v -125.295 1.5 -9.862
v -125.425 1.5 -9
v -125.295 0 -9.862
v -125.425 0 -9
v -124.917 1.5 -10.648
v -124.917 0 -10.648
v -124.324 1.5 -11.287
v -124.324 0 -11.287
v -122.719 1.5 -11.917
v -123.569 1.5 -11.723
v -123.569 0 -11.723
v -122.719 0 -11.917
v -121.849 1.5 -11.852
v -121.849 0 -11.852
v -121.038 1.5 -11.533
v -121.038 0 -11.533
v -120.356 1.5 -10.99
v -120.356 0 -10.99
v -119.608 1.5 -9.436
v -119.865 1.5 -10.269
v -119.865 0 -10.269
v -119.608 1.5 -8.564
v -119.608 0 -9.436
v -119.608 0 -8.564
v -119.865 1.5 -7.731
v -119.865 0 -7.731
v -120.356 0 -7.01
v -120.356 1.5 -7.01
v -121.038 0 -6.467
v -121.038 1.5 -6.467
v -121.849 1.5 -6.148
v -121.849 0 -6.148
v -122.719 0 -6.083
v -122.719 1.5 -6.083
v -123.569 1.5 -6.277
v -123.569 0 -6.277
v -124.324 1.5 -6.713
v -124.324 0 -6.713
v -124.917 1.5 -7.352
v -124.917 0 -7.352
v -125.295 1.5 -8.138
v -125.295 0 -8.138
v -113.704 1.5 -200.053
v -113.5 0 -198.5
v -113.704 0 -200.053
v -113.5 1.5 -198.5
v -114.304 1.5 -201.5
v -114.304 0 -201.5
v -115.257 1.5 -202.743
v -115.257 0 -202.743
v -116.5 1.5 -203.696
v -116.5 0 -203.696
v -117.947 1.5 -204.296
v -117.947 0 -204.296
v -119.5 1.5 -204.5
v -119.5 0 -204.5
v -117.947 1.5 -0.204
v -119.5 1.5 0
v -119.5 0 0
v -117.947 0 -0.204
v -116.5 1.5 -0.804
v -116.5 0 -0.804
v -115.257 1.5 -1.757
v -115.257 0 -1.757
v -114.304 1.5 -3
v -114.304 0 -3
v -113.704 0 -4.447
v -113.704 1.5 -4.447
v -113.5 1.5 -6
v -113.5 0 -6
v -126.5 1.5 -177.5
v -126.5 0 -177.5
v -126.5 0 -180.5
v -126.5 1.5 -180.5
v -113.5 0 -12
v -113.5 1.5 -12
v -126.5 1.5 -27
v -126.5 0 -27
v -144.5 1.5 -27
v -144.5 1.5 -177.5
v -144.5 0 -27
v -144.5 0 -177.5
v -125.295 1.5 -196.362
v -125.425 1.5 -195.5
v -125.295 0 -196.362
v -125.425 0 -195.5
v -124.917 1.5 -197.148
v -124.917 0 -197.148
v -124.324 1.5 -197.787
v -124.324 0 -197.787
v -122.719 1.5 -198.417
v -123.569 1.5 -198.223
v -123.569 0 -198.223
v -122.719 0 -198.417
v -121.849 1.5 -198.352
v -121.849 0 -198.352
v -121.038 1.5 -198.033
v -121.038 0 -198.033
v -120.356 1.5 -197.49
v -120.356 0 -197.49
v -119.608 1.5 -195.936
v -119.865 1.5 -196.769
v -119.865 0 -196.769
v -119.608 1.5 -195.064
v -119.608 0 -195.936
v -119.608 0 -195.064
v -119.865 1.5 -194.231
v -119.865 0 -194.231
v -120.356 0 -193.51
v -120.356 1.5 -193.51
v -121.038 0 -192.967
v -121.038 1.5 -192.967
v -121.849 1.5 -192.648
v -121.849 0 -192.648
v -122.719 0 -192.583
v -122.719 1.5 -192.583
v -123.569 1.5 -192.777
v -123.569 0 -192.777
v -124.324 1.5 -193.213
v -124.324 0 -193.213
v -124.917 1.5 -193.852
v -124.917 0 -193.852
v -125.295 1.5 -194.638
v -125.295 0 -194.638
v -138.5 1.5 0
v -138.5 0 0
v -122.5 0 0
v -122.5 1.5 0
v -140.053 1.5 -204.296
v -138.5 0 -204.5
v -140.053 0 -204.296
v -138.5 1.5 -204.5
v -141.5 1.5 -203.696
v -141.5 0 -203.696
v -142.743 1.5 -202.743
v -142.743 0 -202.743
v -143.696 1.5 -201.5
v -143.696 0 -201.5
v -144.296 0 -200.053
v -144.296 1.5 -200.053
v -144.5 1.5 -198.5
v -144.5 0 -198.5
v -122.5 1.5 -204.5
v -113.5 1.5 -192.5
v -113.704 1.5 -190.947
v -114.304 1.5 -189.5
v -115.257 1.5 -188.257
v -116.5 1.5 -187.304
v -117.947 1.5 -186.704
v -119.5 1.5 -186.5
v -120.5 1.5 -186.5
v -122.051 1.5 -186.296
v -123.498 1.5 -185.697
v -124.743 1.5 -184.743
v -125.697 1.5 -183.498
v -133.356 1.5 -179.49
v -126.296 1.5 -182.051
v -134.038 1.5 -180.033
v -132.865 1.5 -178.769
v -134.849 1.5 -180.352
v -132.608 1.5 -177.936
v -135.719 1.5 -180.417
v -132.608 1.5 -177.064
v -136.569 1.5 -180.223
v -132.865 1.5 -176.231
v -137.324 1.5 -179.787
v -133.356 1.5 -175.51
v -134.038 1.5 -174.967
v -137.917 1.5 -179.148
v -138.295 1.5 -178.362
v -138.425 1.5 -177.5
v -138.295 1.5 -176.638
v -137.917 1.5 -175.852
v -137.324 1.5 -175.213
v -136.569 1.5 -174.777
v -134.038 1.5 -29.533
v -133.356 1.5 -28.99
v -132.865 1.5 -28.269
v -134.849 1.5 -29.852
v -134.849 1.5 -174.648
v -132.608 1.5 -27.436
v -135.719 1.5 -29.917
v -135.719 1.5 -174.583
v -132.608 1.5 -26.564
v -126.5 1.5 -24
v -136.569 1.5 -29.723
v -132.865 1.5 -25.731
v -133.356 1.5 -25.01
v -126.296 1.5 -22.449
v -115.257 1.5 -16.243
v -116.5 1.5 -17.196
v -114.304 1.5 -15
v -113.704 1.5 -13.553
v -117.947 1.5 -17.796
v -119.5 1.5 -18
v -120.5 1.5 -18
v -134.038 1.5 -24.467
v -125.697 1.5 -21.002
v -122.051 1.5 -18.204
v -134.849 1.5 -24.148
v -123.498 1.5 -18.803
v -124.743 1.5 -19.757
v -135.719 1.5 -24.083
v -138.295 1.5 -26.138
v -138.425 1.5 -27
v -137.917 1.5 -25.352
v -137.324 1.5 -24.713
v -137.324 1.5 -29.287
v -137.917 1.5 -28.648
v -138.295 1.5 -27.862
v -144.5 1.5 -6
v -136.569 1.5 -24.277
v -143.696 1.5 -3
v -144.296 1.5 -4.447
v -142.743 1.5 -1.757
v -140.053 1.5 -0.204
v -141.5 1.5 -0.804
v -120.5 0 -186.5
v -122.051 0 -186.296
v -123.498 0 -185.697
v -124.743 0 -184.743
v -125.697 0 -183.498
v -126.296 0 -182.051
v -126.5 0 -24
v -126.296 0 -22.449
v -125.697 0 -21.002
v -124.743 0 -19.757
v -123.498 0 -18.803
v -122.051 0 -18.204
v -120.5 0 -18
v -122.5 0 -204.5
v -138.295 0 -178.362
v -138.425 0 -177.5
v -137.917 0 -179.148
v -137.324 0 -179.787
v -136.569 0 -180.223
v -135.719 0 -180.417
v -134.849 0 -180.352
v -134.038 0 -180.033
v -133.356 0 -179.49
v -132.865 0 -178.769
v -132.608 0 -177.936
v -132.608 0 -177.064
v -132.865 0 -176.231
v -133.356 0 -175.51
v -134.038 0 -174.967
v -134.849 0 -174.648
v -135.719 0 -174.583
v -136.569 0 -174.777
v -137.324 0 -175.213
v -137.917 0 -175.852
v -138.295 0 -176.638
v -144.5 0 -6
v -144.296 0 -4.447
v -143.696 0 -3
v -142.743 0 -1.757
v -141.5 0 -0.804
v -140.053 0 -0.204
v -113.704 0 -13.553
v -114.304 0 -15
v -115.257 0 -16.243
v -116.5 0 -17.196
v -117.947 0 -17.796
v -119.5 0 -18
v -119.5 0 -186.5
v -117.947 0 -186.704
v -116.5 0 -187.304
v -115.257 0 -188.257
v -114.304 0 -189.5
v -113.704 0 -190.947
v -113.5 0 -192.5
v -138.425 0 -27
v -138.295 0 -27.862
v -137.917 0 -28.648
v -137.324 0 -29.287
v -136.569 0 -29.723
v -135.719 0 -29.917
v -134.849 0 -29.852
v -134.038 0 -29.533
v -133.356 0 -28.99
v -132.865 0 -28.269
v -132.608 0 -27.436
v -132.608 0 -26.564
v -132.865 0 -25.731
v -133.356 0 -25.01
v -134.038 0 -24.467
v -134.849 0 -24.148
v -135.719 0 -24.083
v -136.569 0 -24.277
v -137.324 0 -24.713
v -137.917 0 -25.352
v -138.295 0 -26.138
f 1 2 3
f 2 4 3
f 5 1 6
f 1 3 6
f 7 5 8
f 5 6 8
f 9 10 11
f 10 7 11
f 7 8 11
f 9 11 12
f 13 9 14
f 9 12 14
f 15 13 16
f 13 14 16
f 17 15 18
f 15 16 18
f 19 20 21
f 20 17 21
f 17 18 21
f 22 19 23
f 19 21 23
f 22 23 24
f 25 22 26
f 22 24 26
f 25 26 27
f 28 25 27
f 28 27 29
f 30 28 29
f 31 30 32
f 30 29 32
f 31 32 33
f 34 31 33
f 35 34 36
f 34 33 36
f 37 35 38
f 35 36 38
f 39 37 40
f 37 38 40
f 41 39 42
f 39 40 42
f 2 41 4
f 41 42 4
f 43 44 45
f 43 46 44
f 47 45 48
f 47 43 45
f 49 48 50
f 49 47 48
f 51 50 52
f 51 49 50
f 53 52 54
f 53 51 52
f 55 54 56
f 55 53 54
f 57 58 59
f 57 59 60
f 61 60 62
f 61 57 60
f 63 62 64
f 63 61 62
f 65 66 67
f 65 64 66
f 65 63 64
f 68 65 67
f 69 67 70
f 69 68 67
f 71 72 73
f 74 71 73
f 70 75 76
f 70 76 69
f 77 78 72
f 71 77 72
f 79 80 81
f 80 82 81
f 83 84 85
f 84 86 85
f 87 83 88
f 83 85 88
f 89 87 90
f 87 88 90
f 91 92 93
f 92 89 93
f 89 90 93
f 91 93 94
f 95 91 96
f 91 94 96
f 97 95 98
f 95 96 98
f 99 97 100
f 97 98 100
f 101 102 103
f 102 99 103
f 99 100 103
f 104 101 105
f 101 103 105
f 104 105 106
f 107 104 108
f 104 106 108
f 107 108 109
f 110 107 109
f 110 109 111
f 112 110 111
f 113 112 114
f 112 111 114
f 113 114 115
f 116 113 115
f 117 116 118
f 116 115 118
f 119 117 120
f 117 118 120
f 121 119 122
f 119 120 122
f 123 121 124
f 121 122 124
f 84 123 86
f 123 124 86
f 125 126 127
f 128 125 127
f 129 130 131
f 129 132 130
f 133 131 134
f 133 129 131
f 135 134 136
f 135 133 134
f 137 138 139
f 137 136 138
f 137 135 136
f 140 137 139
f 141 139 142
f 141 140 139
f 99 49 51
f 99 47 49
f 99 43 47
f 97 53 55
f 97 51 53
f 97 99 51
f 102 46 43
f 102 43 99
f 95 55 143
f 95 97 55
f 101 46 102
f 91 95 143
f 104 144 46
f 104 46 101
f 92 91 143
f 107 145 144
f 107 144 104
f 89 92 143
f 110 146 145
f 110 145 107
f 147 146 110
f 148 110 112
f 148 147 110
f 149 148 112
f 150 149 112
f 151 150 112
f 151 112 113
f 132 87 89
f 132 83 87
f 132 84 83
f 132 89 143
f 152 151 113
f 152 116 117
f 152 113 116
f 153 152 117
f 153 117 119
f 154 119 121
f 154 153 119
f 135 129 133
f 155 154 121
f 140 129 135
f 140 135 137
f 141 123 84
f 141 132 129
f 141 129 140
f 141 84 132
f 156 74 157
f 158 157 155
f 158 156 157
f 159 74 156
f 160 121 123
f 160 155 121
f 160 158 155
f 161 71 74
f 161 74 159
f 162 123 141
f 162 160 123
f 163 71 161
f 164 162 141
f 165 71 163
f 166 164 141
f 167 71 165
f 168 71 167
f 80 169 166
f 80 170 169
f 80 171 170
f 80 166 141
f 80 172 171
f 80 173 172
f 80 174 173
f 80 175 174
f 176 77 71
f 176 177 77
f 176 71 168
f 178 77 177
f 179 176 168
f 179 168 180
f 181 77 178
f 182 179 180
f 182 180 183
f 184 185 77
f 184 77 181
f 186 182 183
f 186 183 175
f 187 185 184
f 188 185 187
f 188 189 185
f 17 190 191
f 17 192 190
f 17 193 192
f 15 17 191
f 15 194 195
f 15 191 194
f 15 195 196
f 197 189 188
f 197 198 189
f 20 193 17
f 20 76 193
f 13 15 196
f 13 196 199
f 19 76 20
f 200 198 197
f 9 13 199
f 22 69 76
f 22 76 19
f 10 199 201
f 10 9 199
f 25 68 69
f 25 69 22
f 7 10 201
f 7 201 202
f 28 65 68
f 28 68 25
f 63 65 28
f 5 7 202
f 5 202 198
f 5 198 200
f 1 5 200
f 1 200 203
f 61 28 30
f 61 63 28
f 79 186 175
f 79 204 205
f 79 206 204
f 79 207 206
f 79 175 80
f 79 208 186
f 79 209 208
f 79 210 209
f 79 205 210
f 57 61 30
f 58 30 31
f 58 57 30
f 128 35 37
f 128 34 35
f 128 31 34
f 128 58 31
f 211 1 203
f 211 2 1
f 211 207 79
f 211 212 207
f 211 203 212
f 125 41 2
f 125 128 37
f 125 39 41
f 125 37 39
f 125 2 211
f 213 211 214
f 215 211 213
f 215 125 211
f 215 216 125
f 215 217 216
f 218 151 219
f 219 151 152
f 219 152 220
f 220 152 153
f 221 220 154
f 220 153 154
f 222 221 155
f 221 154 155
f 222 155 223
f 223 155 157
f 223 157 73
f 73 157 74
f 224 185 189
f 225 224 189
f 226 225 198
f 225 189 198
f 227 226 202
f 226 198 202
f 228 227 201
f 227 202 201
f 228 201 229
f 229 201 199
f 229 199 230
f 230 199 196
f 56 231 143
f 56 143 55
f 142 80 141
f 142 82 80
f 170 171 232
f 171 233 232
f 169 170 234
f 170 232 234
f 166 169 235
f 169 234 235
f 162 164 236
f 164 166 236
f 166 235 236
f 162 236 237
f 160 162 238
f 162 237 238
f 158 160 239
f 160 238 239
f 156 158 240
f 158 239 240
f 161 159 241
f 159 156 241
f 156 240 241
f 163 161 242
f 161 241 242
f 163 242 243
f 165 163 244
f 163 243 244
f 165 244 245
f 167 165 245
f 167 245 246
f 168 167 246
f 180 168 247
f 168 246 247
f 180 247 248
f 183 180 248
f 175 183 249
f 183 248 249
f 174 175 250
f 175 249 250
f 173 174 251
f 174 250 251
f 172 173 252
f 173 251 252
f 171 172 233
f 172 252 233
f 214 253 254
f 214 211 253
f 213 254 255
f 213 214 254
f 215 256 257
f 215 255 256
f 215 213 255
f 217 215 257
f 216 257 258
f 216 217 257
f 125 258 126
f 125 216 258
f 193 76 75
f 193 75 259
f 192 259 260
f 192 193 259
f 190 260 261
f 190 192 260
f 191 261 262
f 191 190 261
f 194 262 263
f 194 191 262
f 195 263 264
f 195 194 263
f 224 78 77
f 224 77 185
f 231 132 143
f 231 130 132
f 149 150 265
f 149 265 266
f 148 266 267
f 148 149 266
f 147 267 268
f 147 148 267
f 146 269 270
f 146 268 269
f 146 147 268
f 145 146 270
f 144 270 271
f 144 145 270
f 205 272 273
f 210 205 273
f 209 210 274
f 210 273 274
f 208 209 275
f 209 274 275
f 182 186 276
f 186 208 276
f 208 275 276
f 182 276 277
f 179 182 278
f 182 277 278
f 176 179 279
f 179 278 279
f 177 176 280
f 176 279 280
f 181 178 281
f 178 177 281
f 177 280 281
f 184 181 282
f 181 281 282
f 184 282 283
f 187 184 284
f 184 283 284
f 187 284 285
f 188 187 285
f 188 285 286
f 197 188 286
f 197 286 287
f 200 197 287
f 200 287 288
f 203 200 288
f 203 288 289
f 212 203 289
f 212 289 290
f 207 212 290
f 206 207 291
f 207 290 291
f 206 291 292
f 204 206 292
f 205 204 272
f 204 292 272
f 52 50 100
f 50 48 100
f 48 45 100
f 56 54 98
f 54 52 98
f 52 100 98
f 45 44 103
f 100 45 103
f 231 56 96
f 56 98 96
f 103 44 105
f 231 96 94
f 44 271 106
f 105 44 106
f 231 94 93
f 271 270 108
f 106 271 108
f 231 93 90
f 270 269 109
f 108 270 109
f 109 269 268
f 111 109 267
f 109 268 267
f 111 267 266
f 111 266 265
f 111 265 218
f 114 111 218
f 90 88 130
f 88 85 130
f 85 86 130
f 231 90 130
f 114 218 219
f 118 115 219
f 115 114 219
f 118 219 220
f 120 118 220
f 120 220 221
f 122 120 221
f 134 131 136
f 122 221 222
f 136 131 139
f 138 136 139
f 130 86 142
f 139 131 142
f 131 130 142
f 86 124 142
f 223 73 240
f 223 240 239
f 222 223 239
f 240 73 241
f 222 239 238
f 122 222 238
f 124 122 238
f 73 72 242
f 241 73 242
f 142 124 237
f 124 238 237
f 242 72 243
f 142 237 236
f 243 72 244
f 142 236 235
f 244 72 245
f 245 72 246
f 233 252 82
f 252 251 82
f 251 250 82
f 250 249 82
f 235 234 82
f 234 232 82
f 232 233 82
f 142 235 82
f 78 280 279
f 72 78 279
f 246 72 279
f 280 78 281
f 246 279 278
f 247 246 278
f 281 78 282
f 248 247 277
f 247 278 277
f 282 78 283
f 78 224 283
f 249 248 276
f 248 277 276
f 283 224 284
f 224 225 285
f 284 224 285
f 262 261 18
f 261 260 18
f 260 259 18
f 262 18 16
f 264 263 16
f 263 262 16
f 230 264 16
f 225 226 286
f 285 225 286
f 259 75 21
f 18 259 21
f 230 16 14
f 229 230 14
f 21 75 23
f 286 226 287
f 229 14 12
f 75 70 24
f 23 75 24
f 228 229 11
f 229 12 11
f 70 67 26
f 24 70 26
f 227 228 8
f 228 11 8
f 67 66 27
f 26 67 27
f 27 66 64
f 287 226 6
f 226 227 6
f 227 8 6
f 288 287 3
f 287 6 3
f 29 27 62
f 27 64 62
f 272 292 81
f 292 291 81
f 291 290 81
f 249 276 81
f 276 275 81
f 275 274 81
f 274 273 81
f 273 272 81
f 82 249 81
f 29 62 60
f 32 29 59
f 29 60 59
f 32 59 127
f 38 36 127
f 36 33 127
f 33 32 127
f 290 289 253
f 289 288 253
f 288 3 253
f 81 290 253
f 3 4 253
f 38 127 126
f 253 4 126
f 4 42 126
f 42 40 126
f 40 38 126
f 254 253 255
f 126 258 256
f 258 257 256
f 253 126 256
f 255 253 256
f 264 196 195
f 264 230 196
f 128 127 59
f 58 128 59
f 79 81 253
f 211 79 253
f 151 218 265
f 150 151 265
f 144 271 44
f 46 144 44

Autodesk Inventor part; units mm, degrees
ref_plane "YZ Plane" through (0, 0, 0) normal (1, 0, 0) x (0, 1, 0)
ref_plane "XZ Plane" through (0, 0, 0) normal (0, 1, 0) x (-1, 0, 0)
ref_plane "XY Plane" through (0, 0, 0) normal (0, 0, 1) x (1, 0, 0)
sketch "Sketch1" plane through (0, 0, 0) normal (0, 1, 0) x (-1, 0, 0)
  line L0 (0, 0) -> (144.5, 0) construction
  line L1 (144.5, 0) -> (144.5, -204.5) construction
  line L2 (144.5, -204.5) -> (0, -204.5) construction
  line L3 (0, -204.5) -> (0, 0) construction
  circle A0 centre (135.5, -27) radius 3 construction
  circle A1 centre (122.5, -9) radius 3 construction
  circle A2 centre (135.5, -177.5) radius 3 construction
  circle A3 centre (122.5, -195.5) radius 3 construction
  circle A4 centre (22, -195.5) radius 3 construction
  circle A5 centre (9, -177.5) radius 3 construction
  circle A6 centre (9, -27) radius 3 construction
  circle A7 centre (22, -9) radius 3 construction
  line L4 (12, -12) -> (132.5, -12) construction
  line L5 (132.5, -12) -> (132.5, -192.5) construction
  line L6 (132.5, -192.5) -> (12, -192.5) construction
  line L7 (12, -192.5) -> (12, -12) construction
  circle A8 centre (22, -9) radius 2.925
  circle A9 centre (9, -27) radius 2.925
  circle A10 centre (122.5, -9) radius 2.925
  circle A11 centre (135.5, -27) radius 2.925
  circle A12 centre (135.5, -177.5) radius 2.925
  circle A13 centre (122.5, -195.5) radius 2.925
  circle A14 centre (22, -195.5) radius 2.925
  circle A15 centre (9, -177.5) radius 2.925
  line L8 (122.5, -9) -> (135.5, -9) construction
  line L9 (135.5, -9) -> (135.5, -27) construction
  line L10 (126.5, -27) -> (126.5, -18)
  line L11 (126.5, -18) -> (122.5, -18)
  line L12 (144.5, -27) -> (144.5, 0)
  line L13 (144.5, 0) -> (122.5, 0)
  line L14 (122.5, -195.5) -> (135.5, -195.5) construction
  line L15 (135.5, -195.5) -> (135.5, -177.5) construction
  line L16 (126.5, -177.5) -> (126.5, -186.5)
  line L17 (126.5, -186.5) -> (122.5, -186.5)
  line L18 (144.5, -177.5) -> (144.5, -204.5)
  line L19 (144.5, -204.5) -> (122.5, -204.5)
  line L20 (126.5, -27) -> (126.5, -177.5)
  line L21 (144.5, -177.5) -> (144.5, -27)
  line L22 (122.5, -9) -> (113.5, -9) construction
  line L23 (122.5, 0) -> (113.5, 0)
  line L24 (122.5, -18) -> (113.5, -18)
  line L25 (113.5, -18) -> (113.5, 0)
  line L26 (122.5, -195.5) -> (113.5, -195.5) construction
  line L27 (122.5, -204.5) -> (113.5, -204.5)
  line L28 (122.5, -186.5) -> (113.5, -186.5)
  line L29 (113.5, -186.5) -> (113.5, -204.5)
  line L30 (75.275, -87.25) -> (69.225, -87.25) construction
  line L31 (69.225, -87.25) -> (69.225, -117.25) construction
  line L32 (69.225, -117.25) -> (75.275, -117.25) construction
  line L33 (75.275, -117.25) -> (75.275, -87.25) construction
  line L34 (75.185, -87.75) -> (73.8621, -87.75)
  line L35 (69.315, -87.75) -> (69.315, -91.25)
  line L36 (69.315, -116.75) -> (70.6379, -116.75)
  line L37 (75.185, -116.75) -> (75.185, -113.25)
  arc A16 (73.8621, -116.75) -> (75.185, -113.25) centre (75.185, -115.25) ccw
  arc A17 (69.315, -113.25) -> (70.6379, -116.75) centre (69.315, -115.25) ccw
  arc A18 (75.185, -91.25) -> (73.8621, -87.75) centre (75.185, -89.25) ccw
  arc A19 (70.6379, -87.75) -> (69.315, -91.25) centre (69.315, -89.25) ccw
  line L38 (69.315, -91.25) -> (69.315, -113.25)
  line L39 (70.6379, -87.75) -> (69.315, -87.75)
  line L40 (73.8621, -87.75) -> (70.6379, -87.75)
  line L41 (75.185, -91.25) -> (75.185, -87.75)
  line L42 (75.185, -113.25) -> (75.185, -91.25)
  line L43 (70.6379, -116.75) -> (73.8621, -116.75)
  line L44 (73.8621, -116.75) -> (75.185, -116.75)
  line L45 (69.315, -113.25) -> (69.315, -116.75)
  arc A20 (69.315, -91.25) -> (70.6379, -87.75) centre (69.315, -89.25) ccw
  arc A21 (73.8621, -87.75) -> (75.185, -91.25) centre (75.185, -89.25) ccw
  arc A22 (75.185, -113.25) -> (73.8621, -116.75) centre (75.185, -115.25) ccw
  arc A23 (70.6379, -116.75) -> (69.315, -113.25) centre (69.315, -115.25) ccw
  point P0 (132.5, -102.25)
  point P1 (144.5, -102.25)
  point P2 (72.25, -12)
  point P3 (72.25, 0)
  point P4 (72.25, -87.25)
  point P5 (75.275, -102.25)
  point P6 (75.185, -102.25)
  point P7 (72.25, -87.75)
  point P8 (75.185, -102.25)
  point P9 (72.25, -87.75)
  dimension "d0" = 144.5
  dimension "d1" = 204.5
  dimension "d2" = 6
  dimension "d3" = 6
  dimension "d4" = 6
  dimension "d5" = 6
  dimension "d6" = 6
  dimension "d7" = 6
  dimension "d8" = 6
  dimension "d9" = 6
  dimension "d10" = 120.5
  dimension "d11" = 180.5
  dimension "d12" = 15
  dimension "d13" = 10
  dimension "d14" = 10
  dimension "d15" = 15
  dimension "d16" = 15
  dimension "d17" = 10
  dimension "d18" = 10
  dimension "d19" = 15
  dimension "d20" = 0.075
  dimension "d21" = 0.075
  dimension "d22" = 0.075
  dimension "d23" = 0.075
  dimension "d24" = 0.075
  dimension "d25" = 0.075
  dimension "d26" = 0.075
  dimension "d27" = 0.075
  dimension "d28" = 9
  dimension "d29" = 9
  dimension "d30" = 9
  dimension "d31" = 9
  dimension "d32" = 9
  dimension "d33" = 9
  dimension "pcbH" = 6.05
  dimension "pcbW" = 30
  dimension "pcbWcut" = 29
  dimension "pcbHcut" = 5.87
  dimension "clearance" = 4
  dimension "d42" = 1.5
  dimension "d43" = 4
  dimension "d44" = 1.5
  dimension "d45" = 1.5
  dimension "d46" = 1.5
  dimension "d47" = 4
  dimension "d48" = 4
extrude "Extrusion1" add sketch "Sketch1" along normal blind 1.5 contours L10 L11 L24 L25 L23 L13 L12 L21 L18 L19 L27 L29 L28 L17 L16 L20
fillet "Fillet1" radius 6 8 edges at (-144.5, 0.75, 0) (-113.5, 0.75, 0) (-113.5, 0.75, -18) (-126.5, 0.75, -18) (-126.5, 0.75, -186.5) (-113.5, 0.75, -186.5) (-113.5, 0.75, -204.5) (-144.5, 0.75, -204.5)
equation "\"d0\" = height"
equation "\"d1\" = width"
equation "\"d2\" = pinD"
equation "\"d3\" = pinD"
equation "\"d4\" = pinD"
equation "\"d5\" = pinD"
equation "\"d6\" = pinD"
equation "\"d7\" = pinD"
equation "\"d8\" = pinD"
equation "\"d9\" = pinD"
equation "\"d10\" = stencilH"
equation "\"d11\" = stencilW"
equation "\"d12\" = cornerW"
equation "\"d13\" = cornerH"
equation "\"d14\" = cornerH"
equation "\"d15\" = cornerW"
equation "\"d16\" = cornerW"
equation "\"d17\" = cornerH"
equation "\"d18\" = cornerH"
equation "\"d19\" = cornerW"
equation "\"d20\" = kerf"
equation "\"d21\" = kerf"
equation "\"d22\" = kerf"
equation "\"d23\" = kerf"
equation "\"d24\" = kerf"
equation "\"d25\" = kerf"
equation "\"d26\" = kerf"
equation "\"d27\" = kerf"
equation "\"d28\" = 1.5 * pinD"
equation "\"d29\" = 1.5 * pinD"
equation "\"d30\" = 1.5 * pinD"
equation "\"d31\" = 1.5 * pinD"
equation "\"d32\" = 1.5 * pinD"
equation "\"d33\" = 1.5 * pinD"
equation "\"d43\" = clearance"
equation "\"d44\" = d42"
equation "\"d45\" = d42"
equation "\"d46\" = d45"
equation "\"d47\" = clearance"
equation "\"d48\" = clearance"
equation "\"d36\" = pinD"
equation "\"height\" = 144.5"
equation "\"width\" = 204.5"
equation "\"pinD\" = 6"
equation "\"stencilH\" = 120.5"
equation "\"stencilW\" = 180.5"
equation "\"cornerW\" = 15"
equation "\"cornerH\" = 10"
equation "\"kerf\" = 0.075"
properties part number "side"
